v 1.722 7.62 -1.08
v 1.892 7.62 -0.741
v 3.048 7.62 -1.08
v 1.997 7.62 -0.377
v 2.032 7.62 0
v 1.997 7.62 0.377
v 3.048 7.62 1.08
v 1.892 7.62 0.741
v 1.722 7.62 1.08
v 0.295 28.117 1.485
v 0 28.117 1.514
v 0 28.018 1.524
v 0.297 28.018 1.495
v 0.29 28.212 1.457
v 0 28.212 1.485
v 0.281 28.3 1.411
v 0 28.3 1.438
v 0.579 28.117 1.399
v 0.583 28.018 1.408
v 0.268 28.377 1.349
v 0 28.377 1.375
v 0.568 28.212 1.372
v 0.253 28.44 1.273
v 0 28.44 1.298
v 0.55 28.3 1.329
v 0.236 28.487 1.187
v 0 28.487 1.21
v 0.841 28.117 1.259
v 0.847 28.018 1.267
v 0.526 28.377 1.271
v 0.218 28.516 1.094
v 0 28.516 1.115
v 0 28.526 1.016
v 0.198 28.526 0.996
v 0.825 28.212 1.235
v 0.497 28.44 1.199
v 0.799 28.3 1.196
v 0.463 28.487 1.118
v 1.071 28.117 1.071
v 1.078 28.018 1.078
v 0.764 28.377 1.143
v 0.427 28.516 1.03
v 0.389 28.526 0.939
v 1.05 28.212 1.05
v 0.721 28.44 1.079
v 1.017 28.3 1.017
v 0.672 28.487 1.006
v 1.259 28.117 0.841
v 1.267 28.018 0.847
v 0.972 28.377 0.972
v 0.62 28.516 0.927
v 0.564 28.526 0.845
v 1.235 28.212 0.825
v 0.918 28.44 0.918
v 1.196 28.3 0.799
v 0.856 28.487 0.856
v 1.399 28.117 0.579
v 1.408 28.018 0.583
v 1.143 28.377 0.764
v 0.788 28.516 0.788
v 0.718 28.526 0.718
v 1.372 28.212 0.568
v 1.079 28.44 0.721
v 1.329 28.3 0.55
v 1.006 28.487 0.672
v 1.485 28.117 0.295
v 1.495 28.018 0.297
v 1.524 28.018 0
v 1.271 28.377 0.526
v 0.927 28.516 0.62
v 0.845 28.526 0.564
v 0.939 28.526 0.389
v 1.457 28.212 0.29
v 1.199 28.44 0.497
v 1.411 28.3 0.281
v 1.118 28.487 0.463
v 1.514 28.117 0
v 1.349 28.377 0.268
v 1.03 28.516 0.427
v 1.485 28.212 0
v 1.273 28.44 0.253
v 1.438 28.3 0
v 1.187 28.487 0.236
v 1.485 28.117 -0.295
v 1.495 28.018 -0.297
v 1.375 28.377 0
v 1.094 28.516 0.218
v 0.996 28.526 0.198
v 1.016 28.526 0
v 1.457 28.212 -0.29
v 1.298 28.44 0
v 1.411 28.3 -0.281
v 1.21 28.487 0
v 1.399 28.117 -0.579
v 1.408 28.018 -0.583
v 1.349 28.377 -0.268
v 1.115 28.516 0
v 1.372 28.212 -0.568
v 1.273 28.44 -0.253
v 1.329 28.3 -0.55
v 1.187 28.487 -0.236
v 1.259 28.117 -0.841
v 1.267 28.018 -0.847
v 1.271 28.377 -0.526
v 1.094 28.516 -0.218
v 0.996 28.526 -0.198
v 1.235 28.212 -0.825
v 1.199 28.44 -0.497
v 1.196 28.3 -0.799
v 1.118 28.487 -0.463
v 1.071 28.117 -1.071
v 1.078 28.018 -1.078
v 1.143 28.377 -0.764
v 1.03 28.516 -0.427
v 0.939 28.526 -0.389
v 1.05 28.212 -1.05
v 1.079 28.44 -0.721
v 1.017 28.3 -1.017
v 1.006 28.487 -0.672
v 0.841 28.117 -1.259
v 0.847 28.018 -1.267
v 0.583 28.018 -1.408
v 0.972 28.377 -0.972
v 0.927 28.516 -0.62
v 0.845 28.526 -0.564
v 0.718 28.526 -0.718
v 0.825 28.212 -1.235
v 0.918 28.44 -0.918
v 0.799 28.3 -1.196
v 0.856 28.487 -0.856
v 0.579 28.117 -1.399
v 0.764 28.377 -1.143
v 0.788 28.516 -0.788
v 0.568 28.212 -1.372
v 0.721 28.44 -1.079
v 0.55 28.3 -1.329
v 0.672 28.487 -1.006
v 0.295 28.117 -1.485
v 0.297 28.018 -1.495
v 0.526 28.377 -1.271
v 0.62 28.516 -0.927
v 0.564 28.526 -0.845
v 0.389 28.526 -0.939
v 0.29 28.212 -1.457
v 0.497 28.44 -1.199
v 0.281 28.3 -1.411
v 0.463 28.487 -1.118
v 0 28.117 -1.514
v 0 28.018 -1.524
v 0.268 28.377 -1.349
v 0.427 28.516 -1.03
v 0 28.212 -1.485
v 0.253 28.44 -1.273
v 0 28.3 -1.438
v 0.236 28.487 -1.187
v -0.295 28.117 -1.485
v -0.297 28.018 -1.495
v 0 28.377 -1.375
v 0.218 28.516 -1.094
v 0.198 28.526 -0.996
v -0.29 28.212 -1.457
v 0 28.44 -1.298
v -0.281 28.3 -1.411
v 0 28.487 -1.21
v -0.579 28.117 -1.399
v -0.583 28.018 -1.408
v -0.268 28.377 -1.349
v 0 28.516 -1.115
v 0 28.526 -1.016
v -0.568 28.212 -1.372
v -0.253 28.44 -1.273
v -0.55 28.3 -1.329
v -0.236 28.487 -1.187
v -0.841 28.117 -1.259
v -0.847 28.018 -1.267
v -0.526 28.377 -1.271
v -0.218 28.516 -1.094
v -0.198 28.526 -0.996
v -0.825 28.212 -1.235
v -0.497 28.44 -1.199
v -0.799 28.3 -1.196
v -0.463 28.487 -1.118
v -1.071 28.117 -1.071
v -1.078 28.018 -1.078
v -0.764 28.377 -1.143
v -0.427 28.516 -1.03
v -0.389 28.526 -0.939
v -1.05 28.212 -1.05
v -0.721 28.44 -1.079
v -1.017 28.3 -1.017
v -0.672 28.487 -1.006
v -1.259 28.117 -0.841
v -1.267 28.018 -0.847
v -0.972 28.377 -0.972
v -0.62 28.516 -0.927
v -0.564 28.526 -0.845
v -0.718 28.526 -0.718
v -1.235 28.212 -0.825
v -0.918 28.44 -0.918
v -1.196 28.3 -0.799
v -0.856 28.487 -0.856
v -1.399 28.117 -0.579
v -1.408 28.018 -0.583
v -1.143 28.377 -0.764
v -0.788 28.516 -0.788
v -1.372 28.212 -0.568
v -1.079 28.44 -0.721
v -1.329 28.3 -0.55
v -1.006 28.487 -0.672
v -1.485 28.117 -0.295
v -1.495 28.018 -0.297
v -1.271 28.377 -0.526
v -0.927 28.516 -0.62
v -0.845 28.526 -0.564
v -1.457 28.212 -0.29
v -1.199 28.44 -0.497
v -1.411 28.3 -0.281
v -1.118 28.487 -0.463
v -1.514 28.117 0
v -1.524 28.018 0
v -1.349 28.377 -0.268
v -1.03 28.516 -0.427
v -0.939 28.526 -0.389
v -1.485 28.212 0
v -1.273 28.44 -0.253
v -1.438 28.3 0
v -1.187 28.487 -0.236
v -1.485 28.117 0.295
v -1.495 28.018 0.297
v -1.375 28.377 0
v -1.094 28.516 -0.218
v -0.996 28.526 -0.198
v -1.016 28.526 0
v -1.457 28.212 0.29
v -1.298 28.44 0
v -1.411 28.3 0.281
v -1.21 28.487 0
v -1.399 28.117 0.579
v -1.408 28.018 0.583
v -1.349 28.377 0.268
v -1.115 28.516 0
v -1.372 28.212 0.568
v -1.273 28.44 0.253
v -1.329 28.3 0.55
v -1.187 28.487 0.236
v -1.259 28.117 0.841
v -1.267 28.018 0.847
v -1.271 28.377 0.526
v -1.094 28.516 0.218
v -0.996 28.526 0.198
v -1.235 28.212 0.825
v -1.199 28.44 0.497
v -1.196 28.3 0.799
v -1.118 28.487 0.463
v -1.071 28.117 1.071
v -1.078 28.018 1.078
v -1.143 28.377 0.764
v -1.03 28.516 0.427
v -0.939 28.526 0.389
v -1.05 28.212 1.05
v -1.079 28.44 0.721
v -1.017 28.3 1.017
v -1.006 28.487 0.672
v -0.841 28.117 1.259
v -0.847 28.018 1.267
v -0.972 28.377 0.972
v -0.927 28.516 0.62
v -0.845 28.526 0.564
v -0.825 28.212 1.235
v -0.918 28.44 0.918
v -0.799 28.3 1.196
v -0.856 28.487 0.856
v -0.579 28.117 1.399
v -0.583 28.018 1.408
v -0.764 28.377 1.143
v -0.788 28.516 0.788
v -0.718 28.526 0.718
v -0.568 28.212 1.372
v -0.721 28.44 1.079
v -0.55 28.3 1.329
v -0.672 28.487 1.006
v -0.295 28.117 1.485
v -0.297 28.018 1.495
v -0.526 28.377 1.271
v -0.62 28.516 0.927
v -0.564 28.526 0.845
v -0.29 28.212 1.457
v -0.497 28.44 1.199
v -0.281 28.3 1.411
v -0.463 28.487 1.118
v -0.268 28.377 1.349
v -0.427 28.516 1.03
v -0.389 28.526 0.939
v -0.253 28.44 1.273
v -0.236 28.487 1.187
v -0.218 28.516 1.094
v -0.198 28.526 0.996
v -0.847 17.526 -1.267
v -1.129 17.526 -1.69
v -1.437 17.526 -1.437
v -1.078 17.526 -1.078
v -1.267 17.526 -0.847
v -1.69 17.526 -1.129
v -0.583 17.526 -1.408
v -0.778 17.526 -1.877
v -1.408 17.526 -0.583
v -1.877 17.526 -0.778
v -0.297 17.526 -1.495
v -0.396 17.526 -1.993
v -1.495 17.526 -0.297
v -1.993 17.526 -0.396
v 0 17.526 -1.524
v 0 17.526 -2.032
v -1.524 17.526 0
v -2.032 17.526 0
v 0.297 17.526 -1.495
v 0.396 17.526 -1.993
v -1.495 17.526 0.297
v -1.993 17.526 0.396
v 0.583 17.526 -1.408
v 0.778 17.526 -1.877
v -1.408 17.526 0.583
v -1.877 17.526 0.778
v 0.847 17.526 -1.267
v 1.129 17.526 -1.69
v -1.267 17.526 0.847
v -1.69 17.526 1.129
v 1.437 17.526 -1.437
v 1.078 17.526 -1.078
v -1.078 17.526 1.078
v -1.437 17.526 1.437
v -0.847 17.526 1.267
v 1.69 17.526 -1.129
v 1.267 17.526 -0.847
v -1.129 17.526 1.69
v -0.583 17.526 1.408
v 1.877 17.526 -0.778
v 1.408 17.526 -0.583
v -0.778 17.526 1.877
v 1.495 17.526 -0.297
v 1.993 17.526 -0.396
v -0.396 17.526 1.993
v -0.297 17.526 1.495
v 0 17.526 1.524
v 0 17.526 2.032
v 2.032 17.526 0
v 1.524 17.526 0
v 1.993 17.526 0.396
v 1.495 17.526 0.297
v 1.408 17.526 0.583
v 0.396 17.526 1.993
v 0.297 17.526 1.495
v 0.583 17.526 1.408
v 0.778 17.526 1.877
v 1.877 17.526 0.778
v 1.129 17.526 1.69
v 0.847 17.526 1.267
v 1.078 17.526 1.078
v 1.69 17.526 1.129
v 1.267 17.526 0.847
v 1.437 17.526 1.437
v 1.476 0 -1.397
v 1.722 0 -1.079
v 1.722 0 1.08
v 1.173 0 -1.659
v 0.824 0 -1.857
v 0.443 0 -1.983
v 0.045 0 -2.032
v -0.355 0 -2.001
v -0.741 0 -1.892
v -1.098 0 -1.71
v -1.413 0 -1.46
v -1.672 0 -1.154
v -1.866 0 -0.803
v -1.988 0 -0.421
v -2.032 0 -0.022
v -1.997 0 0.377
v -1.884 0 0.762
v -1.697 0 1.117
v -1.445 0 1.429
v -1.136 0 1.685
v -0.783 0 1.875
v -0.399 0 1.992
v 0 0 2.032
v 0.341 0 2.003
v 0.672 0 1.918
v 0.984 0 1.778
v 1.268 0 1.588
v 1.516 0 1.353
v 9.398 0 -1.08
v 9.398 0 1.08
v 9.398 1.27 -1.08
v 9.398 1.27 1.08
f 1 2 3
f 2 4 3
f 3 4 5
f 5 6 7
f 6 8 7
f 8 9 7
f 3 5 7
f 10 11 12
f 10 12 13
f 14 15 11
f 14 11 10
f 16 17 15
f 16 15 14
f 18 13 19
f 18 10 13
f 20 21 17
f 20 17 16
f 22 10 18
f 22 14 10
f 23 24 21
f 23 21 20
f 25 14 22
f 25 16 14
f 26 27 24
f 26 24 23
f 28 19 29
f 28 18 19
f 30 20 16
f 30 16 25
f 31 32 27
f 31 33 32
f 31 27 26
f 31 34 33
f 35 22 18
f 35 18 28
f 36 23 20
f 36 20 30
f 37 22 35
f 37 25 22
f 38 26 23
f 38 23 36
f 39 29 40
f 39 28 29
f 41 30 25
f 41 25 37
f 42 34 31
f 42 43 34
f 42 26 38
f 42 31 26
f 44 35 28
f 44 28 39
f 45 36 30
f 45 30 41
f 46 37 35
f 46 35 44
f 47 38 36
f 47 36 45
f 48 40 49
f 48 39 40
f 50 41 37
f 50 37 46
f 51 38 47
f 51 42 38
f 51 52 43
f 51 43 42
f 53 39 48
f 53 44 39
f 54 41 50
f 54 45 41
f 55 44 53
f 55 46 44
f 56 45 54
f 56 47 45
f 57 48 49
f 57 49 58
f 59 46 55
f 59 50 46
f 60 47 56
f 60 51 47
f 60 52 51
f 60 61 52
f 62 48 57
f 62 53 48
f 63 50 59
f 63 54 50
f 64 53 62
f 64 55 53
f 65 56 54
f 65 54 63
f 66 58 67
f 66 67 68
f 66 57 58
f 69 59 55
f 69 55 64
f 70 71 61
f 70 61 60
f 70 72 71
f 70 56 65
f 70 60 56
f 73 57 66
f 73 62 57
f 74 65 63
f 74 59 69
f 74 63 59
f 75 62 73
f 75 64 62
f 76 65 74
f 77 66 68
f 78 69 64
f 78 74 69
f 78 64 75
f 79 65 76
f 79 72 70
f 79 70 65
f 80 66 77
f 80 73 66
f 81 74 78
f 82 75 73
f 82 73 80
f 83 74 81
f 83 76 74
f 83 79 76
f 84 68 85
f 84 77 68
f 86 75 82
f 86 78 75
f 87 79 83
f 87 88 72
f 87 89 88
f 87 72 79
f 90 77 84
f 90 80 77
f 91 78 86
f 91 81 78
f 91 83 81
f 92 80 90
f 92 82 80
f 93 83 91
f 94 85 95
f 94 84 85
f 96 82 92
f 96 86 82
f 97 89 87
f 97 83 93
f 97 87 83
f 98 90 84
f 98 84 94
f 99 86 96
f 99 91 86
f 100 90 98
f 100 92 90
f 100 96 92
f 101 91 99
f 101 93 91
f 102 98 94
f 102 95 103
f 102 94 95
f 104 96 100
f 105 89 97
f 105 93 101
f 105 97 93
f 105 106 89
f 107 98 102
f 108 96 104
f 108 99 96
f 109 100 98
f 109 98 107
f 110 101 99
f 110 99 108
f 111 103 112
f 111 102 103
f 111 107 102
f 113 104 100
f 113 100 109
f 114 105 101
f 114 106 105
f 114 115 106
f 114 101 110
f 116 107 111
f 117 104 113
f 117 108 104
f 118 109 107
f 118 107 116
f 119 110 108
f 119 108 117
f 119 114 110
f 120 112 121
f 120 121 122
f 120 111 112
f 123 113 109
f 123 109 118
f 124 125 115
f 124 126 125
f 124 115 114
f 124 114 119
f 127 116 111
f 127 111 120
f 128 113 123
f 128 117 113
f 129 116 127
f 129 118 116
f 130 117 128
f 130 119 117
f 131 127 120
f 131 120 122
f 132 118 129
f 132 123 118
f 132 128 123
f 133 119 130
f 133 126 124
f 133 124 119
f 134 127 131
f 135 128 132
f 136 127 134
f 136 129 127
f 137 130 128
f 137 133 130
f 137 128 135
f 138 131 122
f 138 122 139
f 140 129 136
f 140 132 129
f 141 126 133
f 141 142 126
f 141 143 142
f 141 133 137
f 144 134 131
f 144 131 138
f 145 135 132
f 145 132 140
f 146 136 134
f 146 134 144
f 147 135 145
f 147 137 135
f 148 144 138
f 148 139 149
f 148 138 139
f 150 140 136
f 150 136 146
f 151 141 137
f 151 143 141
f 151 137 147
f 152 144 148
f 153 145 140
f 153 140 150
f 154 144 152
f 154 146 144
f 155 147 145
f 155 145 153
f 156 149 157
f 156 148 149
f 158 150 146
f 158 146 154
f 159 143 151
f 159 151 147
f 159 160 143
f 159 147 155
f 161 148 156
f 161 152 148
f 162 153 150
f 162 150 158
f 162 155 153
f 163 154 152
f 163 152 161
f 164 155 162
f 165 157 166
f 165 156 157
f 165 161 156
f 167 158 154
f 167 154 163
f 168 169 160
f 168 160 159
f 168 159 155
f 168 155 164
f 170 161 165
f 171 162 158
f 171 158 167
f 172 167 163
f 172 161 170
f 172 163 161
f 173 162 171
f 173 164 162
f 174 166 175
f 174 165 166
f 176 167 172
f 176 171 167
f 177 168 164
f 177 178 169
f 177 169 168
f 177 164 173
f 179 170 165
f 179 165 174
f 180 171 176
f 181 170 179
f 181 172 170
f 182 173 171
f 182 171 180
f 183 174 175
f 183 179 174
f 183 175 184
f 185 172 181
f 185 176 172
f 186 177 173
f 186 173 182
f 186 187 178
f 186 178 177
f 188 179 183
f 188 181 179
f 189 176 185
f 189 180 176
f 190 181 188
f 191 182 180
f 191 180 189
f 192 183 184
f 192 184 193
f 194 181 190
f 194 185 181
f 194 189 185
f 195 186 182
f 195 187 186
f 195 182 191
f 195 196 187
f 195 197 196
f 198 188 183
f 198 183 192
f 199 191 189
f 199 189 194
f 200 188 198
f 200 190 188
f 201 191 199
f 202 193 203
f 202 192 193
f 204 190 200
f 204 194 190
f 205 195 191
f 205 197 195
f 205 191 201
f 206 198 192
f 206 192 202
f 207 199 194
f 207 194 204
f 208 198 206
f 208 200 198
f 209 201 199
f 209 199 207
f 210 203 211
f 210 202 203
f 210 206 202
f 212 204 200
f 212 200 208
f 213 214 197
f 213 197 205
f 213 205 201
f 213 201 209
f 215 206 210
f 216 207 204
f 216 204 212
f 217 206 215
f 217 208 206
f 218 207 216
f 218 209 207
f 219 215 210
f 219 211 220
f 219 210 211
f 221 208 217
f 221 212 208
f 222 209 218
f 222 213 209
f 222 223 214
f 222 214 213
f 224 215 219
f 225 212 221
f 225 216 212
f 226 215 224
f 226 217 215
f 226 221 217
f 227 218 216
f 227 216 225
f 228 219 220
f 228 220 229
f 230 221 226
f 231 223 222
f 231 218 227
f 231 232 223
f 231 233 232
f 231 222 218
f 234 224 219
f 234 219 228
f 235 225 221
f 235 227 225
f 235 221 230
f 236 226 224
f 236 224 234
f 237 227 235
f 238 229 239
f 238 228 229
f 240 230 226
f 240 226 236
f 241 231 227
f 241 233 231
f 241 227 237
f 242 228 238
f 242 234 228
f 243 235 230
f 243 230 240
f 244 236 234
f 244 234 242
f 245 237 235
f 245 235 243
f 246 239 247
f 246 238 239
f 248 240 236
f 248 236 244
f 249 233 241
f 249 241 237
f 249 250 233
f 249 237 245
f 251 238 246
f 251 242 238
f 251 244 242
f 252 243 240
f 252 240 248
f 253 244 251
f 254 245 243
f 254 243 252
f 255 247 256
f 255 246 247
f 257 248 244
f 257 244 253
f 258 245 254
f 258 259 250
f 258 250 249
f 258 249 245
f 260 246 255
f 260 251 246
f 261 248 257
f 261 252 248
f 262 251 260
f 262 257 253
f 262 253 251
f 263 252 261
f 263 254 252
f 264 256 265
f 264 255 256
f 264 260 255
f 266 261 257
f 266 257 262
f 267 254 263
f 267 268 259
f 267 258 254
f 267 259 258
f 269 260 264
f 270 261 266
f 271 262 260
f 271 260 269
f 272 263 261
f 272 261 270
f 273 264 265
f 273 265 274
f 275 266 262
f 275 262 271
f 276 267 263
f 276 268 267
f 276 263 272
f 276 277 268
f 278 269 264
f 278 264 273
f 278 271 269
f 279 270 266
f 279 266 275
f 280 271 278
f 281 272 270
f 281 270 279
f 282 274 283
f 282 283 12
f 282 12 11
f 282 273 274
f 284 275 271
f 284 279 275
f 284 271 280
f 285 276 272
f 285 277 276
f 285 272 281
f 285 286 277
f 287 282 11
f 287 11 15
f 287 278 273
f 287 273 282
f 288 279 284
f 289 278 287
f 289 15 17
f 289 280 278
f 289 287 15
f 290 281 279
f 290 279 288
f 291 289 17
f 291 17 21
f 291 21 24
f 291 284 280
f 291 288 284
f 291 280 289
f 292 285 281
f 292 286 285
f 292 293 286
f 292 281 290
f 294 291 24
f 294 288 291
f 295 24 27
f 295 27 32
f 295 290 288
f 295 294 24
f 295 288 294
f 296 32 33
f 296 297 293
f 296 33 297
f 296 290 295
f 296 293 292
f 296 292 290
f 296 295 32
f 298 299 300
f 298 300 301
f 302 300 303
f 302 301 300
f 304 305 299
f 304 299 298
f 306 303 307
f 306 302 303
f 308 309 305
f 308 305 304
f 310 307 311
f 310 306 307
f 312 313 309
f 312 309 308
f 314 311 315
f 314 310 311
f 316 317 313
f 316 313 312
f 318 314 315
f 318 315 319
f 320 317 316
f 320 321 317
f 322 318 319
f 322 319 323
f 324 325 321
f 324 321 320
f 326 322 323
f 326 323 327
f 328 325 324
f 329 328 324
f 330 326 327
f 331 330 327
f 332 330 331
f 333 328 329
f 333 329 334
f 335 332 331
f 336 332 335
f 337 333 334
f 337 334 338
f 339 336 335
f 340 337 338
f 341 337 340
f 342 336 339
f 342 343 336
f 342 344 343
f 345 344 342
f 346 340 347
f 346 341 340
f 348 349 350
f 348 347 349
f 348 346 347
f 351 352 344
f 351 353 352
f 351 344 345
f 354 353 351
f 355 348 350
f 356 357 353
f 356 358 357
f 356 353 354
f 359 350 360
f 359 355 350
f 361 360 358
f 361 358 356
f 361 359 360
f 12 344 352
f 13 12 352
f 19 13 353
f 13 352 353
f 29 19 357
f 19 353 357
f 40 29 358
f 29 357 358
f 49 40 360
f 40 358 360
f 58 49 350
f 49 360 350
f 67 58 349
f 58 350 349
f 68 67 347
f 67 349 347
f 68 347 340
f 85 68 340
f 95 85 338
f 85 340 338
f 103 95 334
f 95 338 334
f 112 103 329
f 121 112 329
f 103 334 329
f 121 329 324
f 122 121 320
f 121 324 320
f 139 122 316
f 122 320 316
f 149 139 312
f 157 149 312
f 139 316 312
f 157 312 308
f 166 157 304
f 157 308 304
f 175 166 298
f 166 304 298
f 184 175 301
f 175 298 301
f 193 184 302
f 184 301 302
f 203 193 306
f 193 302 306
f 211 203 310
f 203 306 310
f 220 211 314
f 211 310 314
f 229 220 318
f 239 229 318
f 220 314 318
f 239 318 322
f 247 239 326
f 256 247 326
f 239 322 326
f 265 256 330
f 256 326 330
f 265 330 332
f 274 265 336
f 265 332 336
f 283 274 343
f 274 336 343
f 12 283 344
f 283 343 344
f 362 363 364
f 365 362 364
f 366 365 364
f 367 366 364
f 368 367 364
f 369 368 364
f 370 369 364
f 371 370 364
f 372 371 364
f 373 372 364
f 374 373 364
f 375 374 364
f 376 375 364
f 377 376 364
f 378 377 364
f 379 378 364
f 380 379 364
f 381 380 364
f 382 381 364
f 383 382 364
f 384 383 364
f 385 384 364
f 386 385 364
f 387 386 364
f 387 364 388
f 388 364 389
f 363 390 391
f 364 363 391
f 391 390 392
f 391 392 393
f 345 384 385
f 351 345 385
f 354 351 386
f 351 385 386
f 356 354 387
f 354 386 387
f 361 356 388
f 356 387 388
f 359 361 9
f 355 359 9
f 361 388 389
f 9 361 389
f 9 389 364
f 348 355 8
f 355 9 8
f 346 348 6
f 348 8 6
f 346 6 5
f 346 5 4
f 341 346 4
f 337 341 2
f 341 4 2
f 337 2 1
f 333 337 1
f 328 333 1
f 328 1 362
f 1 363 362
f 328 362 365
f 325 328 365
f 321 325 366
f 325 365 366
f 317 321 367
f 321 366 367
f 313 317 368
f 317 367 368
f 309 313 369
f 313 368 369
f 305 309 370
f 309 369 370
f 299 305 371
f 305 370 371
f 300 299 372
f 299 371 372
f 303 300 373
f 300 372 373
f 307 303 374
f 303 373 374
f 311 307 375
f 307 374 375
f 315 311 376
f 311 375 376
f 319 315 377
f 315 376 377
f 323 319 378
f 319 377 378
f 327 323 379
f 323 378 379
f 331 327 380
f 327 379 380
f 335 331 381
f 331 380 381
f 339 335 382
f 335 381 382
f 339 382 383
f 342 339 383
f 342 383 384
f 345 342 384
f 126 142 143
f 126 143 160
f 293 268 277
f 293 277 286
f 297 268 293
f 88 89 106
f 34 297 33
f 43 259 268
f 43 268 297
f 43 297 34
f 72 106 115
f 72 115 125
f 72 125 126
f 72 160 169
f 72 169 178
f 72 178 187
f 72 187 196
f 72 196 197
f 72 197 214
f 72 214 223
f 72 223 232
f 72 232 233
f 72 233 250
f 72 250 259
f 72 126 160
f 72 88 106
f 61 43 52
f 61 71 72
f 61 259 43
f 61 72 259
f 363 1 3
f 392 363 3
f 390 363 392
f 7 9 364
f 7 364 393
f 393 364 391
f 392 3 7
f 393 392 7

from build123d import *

# Parameters (mm, degrees)
SKETCH1_R           = 2.032
BOSS_EXTRUDE1_DEPTH = 17.526
SKETCH2_W           = 9.398
SKETCH2_H           = 2.159
BOSS_EXTRUDE2_DEPTH = 7.62
CHAMFER1_SIZE       = 6.35
SKETCH3_R           = 1.524
BOSS_EXTRUDE3_DEPTH = 11
FILLET1_R           = 0.508


with BuildPart() as part:
    # Sketch1 → Boss-Extrude1 (new body)
    with BuildSketch(Plane(origin=(0, 0, 0), x_dir=(1, 0, 0), z_dir=(0, 1, 0))):
        with Locations(Location((0, 0, 0), (0, 0, 270))):
            Circle(SKETCH1_R)
    extrude(amount=BOSS_EXTRUDE1_DEPTH)

    # Sketch2 → Boss-Extrude2 (add)
    with BuildSketch(Plane.XZ):
        with Locations((4.699, 0)):
            Rectangle(SKETCH2_W, SKETCH2_H)
    extrude(amount=-BOSS_EXTRUDE2_DEPTH)

    # Chamfer1
    chamfer1_edges = [part.edges().sort_by_distance(p)[0] for p in [
        (9.398, 7.62, 0),
    ]]
    chamfer(chamfer1_edges, length=CHAMFER1_SIZE)

    # Sketch3 → Boss-Extrude3 (add)
    with BuildSketch(Plane(origin=(0, 17.526, 0), x_dir=(1, 0, 0), z_dir=(0, 1, 0))):
        with Locations(Location((0, 0, 0), (0, 0, 270))):
            Circle(SKETCH3_R)
    extrude(amount=BOSS_EXTRUDE3_DEPTH)

    # Fillet1
    fillet1_edges = [part.edges().sort_by_distance(p)[0] for p in [
        (0, 28.526, -1.524),
    ]]
    fillet(fillet1_edges, radius=FILLET1_R)


solid = part.part
